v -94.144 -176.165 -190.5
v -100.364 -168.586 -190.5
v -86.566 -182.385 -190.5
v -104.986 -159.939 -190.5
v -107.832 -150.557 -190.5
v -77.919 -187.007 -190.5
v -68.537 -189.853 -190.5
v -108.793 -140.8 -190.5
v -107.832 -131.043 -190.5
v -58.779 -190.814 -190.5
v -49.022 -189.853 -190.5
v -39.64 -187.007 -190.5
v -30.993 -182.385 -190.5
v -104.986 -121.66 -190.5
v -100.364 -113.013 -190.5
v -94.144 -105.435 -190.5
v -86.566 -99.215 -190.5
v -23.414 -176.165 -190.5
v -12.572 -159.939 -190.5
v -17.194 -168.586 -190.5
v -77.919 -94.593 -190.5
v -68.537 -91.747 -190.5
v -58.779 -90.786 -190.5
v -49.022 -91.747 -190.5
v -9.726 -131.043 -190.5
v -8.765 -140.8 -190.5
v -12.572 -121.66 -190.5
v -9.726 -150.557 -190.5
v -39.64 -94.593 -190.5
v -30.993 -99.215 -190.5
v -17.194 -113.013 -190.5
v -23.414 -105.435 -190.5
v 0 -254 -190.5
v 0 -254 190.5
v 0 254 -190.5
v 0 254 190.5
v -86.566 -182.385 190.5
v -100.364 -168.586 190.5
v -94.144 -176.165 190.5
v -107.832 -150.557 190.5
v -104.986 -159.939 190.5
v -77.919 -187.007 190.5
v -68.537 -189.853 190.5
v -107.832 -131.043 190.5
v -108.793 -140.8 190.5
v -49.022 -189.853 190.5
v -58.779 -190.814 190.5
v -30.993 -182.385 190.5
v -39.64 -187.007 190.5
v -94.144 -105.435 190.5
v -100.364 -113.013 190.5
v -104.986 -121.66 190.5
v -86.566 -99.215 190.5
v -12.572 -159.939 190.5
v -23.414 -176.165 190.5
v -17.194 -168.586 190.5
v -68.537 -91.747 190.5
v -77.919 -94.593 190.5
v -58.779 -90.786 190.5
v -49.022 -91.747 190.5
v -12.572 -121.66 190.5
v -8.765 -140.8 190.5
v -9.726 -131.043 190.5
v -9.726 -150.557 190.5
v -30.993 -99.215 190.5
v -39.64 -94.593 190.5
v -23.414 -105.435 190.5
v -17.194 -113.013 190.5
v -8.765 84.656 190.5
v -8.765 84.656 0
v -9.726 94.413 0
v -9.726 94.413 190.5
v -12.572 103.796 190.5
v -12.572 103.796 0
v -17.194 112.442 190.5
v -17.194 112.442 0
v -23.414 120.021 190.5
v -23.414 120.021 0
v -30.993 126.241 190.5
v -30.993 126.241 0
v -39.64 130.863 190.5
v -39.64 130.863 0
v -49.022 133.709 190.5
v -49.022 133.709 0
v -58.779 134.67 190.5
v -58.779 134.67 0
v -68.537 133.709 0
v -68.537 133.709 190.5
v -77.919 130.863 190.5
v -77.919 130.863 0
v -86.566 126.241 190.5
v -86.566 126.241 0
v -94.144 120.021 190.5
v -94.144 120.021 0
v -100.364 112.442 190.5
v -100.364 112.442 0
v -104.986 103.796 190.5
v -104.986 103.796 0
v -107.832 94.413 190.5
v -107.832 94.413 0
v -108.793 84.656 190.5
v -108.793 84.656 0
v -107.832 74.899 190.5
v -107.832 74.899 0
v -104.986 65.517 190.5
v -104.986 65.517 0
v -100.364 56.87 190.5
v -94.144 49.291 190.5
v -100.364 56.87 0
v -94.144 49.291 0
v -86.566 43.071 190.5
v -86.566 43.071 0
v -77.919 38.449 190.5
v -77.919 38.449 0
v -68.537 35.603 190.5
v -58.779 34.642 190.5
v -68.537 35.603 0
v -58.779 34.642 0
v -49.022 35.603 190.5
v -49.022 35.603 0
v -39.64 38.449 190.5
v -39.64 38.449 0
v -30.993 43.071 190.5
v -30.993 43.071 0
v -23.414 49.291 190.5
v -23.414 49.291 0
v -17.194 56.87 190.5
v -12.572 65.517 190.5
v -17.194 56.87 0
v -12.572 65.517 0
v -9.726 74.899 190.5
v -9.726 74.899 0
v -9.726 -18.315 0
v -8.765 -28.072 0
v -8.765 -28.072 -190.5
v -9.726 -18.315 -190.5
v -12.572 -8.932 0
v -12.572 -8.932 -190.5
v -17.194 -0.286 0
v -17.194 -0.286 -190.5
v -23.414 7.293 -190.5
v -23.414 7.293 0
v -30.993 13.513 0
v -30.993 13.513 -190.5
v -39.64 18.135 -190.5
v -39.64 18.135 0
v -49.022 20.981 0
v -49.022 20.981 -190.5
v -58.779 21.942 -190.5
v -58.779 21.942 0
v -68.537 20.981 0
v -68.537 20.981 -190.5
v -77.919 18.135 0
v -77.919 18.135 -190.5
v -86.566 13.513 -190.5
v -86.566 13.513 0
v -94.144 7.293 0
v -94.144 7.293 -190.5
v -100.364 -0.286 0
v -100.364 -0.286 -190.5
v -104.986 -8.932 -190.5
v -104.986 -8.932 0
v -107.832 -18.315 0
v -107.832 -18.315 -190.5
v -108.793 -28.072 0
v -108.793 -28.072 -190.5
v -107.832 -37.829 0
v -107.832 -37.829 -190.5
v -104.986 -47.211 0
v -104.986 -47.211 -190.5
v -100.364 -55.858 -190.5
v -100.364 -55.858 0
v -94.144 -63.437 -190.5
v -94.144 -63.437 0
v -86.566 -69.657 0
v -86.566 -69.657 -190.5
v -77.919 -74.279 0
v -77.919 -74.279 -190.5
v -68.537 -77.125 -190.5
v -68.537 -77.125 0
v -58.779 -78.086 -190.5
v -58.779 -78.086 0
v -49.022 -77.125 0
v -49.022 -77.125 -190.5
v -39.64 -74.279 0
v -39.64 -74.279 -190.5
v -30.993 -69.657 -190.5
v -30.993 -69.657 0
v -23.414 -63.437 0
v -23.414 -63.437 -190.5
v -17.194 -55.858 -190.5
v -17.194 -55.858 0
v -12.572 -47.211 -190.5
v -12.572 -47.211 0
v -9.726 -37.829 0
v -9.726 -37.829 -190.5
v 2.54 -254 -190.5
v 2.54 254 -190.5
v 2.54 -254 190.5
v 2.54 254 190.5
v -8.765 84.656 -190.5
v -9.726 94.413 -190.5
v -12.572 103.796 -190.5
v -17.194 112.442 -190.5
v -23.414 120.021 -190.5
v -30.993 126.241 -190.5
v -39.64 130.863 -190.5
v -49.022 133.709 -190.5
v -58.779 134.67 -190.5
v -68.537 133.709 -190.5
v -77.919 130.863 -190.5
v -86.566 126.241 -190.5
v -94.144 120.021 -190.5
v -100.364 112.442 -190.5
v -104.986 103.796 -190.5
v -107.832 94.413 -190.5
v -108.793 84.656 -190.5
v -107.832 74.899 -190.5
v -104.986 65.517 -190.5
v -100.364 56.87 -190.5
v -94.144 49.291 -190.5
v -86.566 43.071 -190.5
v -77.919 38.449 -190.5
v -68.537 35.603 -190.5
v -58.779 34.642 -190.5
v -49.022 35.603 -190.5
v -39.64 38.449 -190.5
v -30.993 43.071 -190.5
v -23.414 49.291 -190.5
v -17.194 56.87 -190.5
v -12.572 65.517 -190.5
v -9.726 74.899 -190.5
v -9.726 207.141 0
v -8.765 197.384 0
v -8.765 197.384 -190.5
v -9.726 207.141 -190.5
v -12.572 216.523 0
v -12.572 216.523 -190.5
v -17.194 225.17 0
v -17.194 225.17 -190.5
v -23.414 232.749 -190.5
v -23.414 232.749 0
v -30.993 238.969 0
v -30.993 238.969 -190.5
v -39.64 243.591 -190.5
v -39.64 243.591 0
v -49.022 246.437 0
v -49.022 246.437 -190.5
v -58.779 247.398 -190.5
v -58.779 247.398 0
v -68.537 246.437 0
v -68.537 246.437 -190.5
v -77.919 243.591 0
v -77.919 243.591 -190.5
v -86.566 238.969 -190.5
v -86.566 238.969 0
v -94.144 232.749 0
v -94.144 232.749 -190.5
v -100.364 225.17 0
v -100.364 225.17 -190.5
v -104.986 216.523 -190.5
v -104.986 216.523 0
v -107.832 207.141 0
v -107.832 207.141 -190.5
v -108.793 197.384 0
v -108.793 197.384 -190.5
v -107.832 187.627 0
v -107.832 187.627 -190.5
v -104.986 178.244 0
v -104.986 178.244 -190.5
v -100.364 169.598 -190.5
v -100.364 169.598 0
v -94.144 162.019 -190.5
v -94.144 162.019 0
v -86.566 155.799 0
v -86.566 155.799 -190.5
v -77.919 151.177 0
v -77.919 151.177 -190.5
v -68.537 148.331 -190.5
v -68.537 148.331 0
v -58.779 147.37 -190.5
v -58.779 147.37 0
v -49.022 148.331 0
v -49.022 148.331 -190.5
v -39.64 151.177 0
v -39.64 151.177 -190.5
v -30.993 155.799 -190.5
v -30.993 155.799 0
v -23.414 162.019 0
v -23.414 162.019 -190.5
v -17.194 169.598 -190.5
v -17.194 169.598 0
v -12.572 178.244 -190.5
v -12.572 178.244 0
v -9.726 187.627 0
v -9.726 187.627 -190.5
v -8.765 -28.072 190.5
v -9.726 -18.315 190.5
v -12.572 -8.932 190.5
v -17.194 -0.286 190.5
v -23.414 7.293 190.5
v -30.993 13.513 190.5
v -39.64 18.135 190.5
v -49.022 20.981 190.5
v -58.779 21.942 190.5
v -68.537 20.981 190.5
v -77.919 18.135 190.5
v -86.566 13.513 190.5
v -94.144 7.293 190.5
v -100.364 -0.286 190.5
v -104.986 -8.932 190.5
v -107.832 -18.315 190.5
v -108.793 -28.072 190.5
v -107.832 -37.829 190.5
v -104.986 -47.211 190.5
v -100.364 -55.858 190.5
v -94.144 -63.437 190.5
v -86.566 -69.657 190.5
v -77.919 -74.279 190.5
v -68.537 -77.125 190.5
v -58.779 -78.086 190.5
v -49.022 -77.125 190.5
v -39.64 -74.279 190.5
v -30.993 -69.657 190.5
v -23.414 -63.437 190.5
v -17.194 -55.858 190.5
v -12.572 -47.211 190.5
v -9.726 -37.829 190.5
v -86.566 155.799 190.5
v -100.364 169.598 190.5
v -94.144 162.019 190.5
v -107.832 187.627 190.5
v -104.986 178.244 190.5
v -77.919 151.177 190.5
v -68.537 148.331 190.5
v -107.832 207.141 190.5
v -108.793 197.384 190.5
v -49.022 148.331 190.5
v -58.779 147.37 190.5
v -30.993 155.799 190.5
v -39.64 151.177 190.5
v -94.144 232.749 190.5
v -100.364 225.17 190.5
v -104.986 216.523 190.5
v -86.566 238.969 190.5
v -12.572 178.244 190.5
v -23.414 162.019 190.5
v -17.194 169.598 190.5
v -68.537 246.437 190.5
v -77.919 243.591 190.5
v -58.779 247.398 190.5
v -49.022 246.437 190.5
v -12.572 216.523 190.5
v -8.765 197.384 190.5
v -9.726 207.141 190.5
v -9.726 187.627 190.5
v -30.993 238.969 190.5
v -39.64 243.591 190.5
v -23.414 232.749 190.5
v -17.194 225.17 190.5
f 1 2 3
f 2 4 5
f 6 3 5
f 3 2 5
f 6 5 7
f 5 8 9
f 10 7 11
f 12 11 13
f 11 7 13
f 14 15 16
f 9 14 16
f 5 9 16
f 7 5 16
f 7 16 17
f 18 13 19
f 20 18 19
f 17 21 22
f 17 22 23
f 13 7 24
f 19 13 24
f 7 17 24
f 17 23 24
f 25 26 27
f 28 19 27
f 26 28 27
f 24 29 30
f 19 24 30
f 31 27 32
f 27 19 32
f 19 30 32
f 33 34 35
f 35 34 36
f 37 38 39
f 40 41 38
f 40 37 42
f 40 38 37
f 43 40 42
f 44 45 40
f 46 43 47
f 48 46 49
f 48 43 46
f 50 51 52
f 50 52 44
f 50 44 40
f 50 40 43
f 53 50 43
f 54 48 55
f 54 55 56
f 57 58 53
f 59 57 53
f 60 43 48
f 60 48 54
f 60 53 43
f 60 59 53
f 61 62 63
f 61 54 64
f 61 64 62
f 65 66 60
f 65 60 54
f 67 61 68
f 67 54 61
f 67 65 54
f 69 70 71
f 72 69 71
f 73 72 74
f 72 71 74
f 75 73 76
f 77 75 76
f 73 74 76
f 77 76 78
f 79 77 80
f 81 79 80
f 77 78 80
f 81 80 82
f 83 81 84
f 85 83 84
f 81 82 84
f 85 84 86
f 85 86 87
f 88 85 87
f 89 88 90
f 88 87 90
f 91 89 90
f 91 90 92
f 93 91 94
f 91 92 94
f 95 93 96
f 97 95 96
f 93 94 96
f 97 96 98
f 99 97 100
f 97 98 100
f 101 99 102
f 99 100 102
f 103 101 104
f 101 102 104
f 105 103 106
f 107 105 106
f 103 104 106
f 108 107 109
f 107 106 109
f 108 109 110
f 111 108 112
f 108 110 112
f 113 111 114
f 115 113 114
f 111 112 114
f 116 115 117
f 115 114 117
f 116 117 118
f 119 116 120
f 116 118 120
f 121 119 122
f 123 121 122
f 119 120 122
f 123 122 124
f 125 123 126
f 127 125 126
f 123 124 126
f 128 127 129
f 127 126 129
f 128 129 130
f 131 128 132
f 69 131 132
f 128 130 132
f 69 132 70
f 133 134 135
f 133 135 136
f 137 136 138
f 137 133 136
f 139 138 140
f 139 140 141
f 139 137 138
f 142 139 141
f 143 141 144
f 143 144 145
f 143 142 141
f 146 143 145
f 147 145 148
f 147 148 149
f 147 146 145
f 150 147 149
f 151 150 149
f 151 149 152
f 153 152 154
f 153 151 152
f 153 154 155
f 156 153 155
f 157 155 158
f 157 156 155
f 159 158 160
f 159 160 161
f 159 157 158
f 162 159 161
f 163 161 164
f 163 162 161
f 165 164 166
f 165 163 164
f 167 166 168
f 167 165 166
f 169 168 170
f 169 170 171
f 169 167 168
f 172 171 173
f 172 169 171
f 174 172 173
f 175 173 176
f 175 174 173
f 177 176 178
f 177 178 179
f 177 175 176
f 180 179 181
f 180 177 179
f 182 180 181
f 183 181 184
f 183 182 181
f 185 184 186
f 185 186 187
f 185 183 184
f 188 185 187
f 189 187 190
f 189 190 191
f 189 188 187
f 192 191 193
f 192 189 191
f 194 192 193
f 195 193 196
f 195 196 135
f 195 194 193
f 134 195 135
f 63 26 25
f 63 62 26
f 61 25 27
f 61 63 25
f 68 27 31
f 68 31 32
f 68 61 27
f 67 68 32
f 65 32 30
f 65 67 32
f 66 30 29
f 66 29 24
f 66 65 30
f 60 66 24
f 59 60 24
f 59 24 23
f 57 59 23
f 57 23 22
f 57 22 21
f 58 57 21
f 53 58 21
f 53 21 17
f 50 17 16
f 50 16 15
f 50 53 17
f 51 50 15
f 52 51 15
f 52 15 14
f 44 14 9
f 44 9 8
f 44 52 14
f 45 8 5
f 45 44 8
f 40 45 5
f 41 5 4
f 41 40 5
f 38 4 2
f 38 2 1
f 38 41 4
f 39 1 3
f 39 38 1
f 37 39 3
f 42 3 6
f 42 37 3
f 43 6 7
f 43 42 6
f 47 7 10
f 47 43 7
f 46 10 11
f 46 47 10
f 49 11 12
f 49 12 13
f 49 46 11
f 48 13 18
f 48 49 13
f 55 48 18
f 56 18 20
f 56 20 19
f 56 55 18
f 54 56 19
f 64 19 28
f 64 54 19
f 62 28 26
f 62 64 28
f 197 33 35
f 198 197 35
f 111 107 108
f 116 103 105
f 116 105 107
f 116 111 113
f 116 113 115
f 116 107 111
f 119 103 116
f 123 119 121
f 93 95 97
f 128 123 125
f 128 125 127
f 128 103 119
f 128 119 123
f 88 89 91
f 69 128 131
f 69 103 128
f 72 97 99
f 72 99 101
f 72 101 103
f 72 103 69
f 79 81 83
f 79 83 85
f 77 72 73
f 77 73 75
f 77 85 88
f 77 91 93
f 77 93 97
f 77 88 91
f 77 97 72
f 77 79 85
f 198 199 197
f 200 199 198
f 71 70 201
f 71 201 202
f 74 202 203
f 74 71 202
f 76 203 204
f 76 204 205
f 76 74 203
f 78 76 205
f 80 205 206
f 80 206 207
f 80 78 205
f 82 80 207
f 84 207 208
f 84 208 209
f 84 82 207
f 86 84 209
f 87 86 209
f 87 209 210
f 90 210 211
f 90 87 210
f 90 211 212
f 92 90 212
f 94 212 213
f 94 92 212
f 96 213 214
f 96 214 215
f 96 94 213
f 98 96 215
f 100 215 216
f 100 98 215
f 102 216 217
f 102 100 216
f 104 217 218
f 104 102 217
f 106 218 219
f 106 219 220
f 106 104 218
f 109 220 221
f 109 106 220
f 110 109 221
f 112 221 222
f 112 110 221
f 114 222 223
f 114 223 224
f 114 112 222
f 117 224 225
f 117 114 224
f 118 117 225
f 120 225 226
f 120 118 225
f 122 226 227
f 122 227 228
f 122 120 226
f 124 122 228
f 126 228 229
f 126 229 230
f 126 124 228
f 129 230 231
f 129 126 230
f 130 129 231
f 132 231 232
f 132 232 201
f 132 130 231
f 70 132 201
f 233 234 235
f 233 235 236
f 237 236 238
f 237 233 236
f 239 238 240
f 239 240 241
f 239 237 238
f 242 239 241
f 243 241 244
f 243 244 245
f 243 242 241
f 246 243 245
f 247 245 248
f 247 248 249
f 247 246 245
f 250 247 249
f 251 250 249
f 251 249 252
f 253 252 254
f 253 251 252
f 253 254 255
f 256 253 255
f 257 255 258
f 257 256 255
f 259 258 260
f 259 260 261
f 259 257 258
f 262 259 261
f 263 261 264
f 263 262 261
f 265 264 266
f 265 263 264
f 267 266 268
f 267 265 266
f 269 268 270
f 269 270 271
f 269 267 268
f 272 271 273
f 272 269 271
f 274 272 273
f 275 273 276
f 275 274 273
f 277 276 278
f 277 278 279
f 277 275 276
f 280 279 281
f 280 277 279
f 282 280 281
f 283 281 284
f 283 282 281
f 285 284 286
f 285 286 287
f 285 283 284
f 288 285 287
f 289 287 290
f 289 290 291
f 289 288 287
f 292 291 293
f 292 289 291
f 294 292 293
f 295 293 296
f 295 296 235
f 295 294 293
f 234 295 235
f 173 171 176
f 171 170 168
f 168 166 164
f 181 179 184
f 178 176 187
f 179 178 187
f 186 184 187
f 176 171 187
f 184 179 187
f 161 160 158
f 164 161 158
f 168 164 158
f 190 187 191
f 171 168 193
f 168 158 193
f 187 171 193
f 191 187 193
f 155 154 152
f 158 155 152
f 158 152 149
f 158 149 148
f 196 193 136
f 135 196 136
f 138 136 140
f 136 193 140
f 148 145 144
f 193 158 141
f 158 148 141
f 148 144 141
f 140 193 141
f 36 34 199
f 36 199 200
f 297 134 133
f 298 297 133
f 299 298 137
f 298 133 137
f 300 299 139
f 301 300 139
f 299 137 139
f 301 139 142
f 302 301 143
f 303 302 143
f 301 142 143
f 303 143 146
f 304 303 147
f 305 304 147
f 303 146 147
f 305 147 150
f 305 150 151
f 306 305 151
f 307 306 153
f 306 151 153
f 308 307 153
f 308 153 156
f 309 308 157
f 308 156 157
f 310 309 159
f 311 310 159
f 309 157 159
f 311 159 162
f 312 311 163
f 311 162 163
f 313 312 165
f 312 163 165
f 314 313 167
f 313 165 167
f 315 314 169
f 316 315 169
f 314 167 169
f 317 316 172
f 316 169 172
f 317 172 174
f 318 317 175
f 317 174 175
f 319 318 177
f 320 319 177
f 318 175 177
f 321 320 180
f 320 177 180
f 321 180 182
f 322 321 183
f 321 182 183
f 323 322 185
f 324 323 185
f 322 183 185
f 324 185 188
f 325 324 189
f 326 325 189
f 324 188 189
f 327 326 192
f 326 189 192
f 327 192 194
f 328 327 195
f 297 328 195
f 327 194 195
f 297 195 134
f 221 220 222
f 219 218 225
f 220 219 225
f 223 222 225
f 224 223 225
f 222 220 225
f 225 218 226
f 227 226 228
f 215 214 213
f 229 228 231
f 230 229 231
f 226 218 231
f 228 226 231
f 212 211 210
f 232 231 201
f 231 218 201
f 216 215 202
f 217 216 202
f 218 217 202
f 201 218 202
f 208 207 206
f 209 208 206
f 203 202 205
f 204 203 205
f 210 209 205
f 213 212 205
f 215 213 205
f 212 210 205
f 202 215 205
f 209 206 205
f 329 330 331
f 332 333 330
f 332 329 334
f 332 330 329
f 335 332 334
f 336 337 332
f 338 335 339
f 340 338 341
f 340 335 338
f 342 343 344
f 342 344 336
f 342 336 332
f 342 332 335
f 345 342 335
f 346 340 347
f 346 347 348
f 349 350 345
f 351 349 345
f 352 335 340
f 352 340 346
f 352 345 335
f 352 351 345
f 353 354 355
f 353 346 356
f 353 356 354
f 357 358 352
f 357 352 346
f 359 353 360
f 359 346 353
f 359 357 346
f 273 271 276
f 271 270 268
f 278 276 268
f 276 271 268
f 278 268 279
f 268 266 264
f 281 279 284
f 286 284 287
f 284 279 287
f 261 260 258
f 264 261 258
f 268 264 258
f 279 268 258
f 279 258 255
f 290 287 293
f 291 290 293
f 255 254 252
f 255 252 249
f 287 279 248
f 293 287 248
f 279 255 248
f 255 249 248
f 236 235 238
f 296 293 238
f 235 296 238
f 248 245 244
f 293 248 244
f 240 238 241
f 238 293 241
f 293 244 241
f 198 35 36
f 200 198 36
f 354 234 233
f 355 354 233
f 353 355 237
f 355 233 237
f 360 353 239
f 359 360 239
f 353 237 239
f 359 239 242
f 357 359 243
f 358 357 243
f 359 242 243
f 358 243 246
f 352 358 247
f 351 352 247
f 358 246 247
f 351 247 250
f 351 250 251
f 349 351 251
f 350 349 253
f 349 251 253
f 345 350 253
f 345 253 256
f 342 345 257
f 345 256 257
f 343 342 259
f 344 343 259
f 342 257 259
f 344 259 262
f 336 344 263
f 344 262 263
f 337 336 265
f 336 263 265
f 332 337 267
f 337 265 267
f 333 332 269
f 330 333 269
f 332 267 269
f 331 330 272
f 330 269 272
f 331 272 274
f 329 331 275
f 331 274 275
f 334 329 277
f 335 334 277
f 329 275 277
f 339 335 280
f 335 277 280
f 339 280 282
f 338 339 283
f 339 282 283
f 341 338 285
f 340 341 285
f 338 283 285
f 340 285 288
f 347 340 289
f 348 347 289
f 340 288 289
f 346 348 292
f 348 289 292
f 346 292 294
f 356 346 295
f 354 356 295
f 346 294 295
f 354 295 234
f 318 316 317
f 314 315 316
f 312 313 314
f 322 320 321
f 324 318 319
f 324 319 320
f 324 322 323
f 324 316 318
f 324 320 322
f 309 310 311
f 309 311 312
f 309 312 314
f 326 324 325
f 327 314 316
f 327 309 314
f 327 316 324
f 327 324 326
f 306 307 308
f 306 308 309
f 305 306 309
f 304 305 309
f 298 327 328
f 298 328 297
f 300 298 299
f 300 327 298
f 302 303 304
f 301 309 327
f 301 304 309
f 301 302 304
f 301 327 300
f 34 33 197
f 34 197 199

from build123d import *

# Parameters (mm, degrees)
F0_W     = 508
F0_H     = 381
F1_DEPTH = 2.54
F2_R     = 50.013952
F3_DEPTH = 190.5


with BuildPart() as f1:
    # F0 (on Right) → F1 (new body)
    with BuildSketch(Plane.YZ):
        Rectangle(F0_W, F0_H)
    extrude(amount=F1_DEPTH)


with BuildPart() as f3:
    # F2 (on Top) → F3 (new body, symmetric)
    with BuildSketch(Plane.XY):
        with Locations((-58.779277, 197.38397)):
            Circle(F2_R)
        with Locations((-58.779277, 84.656067)):
            Circle(F2_R)
        with Locations((-58.779277, -28.071837)):
            Circle(F2_R)
        with Locations((-58.779277, -140.79974)):
            Circle(F2_R)
    extrude(amount=F3_DEPTH, both=True)


solid = Compound([f1.part, f3.part])
